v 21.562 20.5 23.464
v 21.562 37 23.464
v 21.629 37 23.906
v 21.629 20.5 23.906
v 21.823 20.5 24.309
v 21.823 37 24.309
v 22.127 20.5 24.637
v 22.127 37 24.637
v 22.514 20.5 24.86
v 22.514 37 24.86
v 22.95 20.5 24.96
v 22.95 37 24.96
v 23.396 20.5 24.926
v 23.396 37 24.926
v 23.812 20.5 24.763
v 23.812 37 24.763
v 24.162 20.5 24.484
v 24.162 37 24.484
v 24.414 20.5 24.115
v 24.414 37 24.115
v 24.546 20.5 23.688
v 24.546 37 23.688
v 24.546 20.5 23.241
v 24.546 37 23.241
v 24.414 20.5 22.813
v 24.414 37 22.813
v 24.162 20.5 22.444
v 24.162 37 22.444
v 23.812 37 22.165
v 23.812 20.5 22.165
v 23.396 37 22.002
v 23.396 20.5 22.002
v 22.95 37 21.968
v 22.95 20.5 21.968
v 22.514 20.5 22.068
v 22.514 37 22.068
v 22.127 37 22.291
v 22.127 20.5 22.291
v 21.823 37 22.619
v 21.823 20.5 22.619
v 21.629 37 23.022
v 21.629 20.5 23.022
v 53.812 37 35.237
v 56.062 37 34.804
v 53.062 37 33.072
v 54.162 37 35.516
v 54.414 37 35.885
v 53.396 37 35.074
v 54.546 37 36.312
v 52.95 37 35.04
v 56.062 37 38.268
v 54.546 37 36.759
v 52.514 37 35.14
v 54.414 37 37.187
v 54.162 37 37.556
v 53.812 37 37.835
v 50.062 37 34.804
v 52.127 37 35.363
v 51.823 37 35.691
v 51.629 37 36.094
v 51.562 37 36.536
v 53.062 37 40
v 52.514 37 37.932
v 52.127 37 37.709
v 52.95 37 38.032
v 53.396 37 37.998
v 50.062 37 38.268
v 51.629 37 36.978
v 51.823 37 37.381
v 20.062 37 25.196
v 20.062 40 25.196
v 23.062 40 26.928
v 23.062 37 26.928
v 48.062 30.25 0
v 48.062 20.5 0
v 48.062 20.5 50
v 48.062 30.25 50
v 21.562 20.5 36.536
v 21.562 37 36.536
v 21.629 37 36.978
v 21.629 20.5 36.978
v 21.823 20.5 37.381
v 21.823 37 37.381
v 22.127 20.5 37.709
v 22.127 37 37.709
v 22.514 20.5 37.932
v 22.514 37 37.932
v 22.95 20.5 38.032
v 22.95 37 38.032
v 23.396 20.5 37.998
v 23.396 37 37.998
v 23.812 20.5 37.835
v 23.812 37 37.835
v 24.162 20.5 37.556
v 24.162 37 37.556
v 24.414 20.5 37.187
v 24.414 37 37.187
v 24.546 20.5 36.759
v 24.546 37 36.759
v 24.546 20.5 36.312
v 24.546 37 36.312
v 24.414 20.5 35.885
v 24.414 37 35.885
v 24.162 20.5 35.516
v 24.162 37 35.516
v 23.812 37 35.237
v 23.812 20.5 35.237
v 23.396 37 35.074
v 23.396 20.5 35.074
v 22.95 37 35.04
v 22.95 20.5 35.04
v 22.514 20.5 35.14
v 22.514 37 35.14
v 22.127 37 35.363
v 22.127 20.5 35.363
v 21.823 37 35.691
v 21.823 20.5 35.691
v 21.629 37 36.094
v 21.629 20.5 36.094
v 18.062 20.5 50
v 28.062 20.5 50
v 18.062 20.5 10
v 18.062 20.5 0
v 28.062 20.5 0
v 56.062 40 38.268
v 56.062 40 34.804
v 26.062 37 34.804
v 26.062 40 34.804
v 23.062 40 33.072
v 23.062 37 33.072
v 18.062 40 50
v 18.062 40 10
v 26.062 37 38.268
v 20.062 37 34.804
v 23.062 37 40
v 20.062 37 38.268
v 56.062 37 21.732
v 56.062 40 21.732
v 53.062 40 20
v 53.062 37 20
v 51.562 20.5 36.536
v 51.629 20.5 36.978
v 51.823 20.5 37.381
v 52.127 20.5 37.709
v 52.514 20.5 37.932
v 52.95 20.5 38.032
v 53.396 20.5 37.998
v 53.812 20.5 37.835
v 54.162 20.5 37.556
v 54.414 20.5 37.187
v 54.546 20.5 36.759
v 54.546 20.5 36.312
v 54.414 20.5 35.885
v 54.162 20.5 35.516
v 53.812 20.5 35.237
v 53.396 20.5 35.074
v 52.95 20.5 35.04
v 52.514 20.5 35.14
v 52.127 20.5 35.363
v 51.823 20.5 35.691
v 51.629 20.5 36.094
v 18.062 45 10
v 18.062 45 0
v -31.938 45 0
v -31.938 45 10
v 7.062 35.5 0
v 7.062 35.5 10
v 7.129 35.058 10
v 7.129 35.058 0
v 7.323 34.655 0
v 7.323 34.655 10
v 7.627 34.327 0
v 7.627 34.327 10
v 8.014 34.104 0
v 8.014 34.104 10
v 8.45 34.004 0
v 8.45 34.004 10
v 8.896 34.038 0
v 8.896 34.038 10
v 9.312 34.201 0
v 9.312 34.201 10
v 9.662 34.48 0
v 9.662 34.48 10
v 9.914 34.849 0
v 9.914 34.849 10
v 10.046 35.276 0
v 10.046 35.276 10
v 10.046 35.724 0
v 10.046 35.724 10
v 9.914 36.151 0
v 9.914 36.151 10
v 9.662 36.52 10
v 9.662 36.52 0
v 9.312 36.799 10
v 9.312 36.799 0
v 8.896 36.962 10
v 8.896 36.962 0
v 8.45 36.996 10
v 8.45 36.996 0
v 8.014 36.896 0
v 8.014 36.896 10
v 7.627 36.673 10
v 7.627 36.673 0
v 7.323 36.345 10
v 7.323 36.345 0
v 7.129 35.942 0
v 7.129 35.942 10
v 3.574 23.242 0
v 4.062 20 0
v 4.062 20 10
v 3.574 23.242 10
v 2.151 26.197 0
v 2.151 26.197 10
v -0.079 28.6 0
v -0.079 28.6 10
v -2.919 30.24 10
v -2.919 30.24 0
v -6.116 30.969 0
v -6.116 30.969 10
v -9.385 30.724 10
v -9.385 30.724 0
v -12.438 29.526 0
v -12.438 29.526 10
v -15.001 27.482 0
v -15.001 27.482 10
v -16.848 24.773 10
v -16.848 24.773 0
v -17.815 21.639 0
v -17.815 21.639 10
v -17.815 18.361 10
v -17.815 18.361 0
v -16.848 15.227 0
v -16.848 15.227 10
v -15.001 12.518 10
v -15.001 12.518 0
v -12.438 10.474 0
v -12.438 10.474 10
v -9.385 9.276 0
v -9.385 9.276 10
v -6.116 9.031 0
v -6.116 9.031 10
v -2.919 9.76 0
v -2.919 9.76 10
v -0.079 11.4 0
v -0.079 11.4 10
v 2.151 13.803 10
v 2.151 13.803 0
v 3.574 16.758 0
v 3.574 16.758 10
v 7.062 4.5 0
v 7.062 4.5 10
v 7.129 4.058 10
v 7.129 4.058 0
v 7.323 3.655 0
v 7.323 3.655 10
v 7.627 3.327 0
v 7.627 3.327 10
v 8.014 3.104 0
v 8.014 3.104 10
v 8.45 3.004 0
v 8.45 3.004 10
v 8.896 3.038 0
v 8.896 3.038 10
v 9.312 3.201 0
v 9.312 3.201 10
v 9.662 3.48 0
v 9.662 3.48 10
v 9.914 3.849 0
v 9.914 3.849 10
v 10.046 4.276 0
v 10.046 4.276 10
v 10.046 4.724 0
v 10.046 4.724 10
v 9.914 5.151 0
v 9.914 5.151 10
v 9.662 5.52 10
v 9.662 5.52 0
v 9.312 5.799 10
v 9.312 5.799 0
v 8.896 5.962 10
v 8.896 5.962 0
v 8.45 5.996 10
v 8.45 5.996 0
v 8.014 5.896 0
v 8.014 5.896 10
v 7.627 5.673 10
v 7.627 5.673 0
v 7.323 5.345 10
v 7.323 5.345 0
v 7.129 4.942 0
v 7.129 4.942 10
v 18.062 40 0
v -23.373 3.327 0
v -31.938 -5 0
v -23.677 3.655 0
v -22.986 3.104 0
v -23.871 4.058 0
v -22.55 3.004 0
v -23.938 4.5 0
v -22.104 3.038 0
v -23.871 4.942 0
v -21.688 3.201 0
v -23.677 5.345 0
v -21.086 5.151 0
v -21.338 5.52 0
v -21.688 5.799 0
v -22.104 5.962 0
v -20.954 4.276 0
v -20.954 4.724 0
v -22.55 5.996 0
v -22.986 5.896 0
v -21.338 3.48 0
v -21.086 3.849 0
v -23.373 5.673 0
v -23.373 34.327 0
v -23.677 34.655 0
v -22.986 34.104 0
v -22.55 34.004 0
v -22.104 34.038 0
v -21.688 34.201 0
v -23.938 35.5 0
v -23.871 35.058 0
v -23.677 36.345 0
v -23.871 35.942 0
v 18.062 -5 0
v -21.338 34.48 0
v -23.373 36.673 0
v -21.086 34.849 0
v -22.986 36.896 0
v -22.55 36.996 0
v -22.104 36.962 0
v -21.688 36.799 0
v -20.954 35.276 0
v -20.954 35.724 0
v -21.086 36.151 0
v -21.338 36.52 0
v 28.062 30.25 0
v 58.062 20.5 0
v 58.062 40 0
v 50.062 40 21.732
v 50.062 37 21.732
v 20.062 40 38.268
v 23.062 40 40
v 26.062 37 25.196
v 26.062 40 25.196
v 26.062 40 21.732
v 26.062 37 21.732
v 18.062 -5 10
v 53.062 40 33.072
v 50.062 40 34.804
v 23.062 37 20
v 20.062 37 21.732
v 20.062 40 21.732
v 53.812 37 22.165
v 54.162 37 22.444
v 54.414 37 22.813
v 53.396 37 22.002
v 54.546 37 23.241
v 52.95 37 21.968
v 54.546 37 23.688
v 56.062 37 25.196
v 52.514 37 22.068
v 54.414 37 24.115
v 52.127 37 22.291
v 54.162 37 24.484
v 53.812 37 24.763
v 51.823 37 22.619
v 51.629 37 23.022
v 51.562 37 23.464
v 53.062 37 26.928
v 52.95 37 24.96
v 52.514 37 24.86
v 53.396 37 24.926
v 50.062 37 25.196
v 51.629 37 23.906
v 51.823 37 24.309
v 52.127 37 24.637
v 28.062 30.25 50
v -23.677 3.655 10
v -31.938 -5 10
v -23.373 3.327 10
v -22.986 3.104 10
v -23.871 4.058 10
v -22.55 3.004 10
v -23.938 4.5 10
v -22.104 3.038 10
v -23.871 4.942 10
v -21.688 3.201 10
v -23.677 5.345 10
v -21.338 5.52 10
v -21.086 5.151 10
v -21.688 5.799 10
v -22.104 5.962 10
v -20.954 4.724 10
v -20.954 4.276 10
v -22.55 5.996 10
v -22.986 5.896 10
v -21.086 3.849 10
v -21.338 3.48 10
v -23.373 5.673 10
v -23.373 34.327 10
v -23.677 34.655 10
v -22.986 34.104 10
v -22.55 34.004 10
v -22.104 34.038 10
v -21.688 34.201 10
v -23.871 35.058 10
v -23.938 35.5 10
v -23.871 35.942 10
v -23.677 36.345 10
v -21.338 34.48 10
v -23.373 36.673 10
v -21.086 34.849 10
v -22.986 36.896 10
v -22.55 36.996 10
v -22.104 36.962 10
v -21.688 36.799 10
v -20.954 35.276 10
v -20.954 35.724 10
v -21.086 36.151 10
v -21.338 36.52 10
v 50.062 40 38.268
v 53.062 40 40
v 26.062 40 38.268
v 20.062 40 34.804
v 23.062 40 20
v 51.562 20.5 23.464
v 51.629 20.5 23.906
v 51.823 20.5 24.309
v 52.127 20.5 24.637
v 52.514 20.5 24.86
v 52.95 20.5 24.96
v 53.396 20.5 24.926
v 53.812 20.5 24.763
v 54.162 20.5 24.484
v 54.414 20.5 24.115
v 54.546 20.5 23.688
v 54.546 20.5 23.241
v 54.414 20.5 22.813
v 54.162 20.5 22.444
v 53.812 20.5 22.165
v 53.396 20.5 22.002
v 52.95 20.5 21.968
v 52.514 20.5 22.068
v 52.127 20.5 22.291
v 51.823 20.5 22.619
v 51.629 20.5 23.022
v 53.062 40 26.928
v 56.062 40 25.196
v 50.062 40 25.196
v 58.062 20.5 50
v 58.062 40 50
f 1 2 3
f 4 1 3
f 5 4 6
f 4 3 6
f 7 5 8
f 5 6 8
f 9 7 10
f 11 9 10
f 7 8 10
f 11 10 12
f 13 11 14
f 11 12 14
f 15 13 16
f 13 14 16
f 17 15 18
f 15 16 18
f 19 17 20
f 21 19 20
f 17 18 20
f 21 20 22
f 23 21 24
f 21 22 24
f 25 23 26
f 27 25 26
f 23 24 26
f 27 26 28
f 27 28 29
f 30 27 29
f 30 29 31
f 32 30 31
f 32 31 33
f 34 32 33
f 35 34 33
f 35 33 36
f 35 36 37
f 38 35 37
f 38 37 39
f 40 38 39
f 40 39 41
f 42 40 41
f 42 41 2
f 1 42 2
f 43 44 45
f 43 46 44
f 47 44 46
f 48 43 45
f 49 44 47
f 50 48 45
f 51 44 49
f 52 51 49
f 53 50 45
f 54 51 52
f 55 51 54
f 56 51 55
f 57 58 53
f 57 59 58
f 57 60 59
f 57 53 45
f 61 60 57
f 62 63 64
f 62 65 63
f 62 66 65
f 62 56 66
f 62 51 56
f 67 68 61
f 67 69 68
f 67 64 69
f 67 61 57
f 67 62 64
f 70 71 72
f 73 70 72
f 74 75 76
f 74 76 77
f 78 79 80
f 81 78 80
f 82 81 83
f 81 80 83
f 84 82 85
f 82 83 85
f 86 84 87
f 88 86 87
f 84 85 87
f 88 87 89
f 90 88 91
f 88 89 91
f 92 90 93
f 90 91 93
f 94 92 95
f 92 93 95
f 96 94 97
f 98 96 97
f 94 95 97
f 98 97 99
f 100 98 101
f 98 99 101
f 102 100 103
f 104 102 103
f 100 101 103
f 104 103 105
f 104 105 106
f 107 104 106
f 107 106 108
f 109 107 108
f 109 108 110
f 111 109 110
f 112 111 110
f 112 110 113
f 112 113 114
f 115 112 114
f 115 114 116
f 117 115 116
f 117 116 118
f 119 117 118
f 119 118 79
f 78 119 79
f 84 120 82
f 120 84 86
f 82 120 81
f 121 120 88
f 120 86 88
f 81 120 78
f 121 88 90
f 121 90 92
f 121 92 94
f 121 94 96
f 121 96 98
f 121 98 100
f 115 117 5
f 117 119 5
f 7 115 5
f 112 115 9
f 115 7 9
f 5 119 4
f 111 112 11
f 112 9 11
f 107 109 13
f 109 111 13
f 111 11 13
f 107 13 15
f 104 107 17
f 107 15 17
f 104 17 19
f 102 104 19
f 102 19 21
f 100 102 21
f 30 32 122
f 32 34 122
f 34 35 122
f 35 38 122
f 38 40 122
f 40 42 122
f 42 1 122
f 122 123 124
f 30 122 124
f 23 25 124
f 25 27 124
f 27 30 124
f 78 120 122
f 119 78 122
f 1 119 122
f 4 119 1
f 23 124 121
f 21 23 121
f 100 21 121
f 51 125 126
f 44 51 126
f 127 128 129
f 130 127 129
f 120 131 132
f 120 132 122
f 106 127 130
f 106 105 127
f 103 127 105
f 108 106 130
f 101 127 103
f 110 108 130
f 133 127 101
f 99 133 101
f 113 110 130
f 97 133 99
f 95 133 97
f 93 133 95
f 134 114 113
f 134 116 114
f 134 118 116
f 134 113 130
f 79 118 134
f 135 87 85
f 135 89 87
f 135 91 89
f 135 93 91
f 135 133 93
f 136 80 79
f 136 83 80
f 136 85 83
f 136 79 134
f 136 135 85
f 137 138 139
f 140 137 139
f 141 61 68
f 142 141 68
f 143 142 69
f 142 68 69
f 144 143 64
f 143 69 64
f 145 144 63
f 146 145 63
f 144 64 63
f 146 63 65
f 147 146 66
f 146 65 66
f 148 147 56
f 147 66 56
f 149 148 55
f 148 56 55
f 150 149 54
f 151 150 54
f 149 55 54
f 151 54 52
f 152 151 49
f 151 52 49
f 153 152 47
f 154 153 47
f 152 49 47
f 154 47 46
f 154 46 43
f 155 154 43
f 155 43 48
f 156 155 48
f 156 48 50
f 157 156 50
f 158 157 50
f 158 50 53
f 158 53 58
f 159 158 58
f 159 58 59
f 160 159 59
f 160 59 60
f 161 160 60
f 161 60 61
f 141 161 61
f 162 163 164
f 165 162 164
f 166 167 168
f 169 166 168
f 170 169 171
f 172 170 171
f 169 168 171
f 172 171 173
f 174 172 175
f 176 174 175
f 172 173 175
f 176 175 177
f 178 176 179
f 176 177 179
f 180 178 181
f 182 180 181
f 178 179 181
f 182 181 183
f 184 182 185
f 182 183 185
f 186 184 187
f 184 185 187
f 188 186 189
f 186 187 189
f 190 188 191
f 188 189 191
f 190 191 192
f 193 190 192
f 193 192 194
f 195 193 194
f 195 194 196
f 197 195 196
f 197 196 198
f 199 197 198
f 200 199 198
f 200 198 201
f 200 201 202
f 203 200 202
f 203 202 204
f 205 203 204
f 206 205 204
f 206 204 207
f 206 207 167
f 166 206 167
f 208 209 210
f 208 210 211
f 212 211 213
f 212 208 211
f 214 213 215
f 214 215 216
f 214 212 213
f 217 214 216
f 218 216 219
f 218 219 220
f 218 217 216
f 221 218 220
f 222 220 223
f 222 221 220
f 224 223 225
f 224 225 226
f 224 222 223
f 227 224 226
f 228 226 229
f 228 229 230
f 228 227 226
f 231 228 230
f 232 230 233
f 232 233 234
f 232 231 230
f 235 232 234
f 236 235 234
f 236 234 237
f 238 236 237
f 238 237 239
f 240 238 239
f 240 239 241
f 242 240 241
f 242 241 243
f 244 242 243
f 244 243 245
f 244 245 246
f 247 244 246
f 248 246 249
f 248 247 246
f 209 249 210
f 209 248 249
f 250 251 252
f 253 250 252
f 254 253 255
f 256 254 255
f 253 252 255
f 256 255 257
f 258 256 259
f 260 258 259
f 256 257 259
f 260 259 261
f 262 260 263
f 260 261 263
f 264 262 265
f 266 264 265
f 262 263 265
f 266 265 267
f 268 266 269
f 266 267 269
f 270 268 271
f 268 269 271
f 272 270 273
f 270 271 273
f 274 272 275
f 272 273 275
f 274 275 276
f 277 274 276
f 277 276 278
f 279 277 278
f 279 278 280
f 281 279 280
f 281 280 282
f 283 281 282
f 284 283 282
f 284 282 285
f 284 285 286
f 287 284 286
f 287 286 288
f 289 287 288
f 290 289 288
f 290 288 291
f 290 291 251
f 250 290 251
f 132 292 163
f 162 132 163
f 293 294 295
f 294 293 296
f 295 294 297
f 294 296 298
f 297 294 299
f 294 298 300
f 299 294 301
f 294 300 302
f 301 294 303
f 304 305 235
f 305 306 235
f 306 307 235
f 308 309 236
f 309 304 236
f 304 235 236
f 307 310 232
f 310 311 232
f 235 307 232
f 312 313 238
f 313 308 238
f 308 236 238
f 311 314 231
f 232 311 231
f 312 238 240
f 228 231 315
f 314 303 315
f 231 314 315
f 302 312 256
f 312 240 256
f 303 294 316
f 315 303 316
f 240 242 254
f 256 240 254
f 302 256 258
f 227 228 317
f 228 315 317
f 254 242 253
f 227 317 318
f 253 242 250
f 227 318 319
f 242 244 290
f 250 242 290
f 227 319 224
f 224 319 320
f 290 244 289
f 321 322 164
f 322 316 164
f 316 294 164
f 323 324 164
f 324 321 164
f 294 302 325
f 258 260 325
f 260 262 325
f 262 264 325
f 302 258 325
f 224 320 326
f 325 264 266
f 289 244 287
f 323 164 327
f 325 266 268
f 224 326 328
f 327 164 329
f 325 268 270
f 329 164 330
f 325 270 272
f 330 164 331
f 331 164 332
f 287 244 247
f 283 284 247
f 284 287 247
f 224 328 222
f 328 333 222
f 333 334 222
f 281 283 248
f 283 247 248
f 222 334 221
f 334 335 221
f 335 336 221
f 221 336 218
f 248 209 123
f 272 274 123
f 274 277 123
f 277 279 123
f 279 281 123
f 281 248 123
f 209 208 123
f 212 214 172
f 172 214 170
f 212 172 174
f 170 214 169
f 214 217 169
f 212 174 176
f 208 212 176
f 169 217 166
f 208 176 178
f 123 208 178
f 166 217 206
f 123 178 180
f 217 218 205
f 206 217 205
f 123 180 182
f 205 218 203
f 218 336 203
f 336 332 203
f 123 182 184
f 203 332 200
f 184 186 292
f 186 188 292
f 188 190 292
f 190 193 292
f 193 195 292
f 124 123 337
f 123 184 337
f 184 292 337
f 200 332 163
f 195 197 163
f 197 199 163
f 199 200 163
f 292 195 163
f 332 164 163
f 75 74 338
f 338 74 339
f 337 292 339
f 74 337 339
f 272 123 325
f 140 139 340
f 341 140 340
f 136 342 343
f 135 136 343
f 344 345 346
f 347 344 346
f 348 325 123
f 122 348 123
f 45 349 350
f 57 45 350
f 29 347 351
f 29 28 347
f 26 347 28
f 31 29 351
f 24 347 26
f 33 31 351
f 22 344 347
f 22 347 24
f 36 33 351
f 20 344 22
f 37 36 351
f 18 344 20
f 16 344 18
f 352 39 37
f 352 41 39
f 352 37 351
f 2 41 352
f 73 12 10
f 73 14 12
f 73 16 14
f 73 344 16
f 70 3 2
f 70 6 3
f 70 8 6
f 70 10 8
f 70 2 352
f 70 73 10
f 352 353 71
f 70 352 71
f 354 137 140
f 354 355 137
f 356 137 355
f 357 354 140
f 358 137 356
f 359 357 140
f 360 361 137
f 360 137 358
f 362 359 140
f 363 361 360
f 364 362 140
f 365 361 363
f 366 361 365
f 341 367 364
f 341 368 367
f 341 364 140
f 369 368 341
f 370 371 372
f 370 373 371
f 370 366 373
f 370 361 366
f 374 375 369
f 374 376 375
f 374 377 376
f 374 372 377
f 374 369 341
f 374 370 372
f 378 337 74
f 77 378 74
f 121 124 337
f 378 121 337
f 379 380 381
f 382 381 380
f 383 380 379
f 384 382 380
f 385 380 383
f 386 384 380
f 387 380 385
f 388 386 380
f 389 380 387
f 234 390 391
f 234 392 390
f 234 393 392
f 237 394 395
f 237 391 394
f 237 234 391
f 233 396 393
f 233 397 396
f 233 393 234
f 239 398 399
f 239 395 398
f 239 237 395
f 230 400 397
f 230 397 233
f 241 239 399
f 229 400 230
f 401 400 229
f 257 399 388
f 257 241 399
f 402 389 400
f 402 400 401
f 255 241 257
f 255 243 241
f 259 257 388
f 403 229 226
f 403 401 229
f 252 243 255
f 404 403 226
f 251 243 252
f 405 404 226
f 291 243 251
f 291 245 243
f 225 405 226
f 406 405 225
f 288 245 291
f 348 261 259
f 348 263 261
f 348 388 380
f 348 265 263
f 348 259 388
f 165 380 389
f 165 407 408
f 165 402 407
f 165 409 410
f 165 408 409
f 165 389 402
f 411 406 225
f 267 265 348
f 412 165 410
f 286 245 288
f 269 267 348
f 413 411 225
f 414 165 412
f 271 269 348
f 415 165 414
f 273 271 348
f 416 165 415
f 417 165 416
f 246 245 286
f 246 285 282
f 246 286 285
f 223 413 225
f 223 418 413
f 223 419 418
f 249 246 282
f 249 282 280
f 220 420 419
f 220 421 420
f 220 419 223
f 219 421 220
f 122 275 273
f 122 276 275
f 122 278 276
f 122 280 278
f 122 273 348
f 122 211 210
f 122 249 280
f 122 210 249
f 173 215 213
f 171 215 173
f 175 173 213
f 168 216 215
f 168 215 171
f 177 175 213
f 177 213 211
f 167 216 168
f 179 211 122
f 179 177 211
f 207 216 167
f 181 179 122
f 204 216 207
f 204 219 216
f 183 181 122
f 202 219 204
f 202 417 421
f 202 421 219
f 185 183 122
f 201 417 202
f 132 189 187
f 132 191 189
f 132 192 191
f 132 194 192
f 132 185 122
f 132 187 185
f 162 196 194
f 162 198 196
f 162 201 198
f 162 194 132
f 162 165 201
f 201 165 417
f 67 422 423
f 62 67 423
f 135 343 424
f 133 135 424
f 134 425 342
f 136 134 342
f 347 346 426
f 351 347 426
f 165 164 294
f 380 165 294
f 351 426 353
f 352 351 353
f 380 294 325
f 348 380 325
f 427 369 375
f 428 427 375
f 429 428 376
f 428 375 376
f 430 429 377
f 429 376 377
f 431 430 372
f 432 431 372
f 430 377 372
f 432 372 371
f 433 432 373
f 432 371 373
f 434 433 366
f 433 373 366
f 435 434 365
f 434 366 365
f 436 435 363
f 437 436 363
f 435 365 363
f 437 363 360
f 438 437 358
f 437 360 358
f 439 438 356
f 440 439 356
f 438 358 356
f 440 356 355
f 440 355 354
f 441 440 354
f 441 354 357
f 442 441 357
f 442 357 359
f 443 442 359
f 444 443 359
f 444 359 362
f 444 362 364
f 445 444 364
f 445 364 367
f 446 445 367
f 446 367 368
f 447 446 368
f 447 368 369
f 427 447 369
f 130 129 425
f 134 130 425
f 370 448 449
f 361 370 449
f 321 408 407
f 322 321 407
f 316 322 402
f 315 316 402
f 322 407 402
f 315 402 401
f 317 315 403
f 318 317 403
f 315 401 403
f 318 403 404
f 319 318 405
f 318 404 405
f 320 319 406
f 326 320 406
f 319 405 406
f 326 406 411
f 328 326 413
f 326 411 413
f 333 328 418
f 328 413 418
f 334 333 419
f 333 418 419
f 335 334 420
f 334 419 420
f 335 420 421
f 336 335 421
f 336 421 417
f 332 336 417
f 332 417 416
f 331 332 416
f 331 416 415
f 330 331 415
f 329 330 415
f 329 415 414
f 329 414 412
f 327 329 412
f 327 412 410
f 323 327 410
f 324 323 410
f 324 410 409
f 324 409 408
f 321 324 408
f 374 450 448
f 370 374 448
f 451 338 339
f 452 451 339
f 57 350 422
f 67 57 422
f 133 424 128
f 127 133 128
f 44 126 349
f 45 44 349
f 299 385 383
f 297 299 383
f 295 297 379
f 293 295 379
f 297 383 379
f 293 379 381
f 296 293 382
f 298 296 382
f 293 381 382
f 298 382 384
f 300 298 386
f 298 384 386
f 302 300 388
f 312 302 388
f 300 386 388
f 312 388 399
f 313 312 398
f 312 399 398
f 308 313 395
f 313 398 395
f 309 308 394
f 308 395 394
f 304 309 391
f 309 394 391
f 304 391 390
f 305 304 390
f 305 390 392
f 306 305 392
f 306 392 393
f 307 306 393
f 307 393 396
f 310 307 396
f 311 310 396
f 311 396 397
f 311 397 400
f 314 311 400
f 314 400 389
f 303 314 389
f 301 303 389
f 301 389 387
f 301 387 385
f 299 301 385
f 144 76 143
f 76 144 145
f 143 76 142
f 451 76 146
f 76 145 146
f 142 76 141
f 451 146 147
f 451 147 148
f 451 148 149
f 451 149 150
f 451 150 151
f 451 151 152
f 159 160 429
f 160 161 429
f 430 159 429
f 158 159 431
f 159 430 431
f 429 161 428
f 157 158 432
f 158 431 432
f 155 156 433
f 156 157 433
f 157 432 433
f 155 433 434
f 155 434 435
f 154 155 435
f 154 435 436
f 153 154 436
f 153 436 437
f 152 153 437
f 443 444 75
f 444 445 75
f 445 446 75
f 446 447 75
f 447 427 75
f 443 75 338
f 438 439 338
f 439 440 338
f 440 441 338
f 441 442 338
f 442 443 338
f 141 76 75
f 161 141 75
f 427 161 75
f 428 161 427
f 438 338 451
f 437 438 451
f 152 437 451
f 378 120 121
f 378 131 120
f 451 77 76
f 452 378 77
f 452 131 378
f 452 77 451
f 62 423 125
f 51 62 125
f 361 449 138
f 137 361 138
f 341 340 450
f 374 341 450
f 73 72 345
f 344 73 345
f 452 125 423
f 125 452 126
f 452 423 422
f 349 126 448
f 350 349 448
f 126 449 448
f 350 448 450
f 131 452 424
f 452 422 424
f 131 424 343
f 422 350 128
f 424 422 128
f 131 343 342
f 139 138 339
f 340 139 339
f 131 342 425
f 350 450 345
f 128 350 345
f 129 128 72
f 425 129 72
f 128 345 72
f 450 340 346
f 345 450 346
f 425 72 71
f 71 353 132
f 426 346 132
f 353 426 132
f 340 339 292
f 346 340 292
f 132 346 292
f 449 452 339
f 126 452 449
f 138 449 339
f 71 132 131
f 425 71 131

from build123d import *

# Parameters (mm, degrees)
F0_R     = 11
F1_DEPTH = 10
F3_D     = 3
F0_W     = 10
F0_H     = 9.75
F0_W_2   = 20
F4_DEPTH = 50
F5_R     = 1.5
F6_DEPTH = 3
F7_DEPTH = 20


with BuildPart() as f1:
    # F0 (on Top) → F1 (new body)
    with BuildSketch(Plane.XY):
        Polygon((18.0623630062, 45), (-31.9376369938, 45), (-31.9376369938, -5), (18.0623630062, -5), (18.0623630062, 0), (18.0623630062, 20.5), (18.0623630062, 30.25), (18.0623630062, 40), align=None)
        with Locations((-6.9376369938, 20)):
            Circle(F0_R, mode=Mode.SUBTRACT)
    extrude(amount=F1_DEPTH)

    # F3 (through all)
    with Locations(Plane(origin=(0, 0, 0), x_dir=(1, 0, 0), z_dir=(0, 0, -1))):
        with Locations((8.5623630062, -4.5), (-22.4376369938, -4.5), (-22.4376369938, -35.5), (8.5623630062, -35.5)):
            Hole(F3_D / 2)

    # F0 (on Top) → F4 (join)
    with BuildSketch(Plane.XY):
        with Locations((23.0623630062, 25.375)):
            Rectangle(F0_W, F0_H)
        with Locations((23.0623630062, 35.125)):
            Rectangle(F0_W, F0_H)
        with Locations((38.0623630062, 35.125)):
            Rectangle(F0_W_2, F0_H)
        with Locations((53.0623630062, 35.125)):
            Rectangle(F0_W, F0_H)
        with Locations((53.0623630062, 25.375)):
            Rectangle(F0_W, F0_H)
    extrude(amount=F4_DEPTH)

    # F5 (on face) → F6 (cut)
    with BuildSketch(Plane(origin=(0, 40, 0), x_dir=(-1, 0, 0), z_dir=(0, 1, 0))):
        Polygon((-20.0623630062, 25.1961524227), (-23.0623630062, 26.9282032303), (-26.0623630062, 25.1961524227), (-26.0623630062, 21.7320508076), (-23.0623630062, 20), (-20.0623630062, 21.7320508076), align=None)
        with Locations((-23.0623630062, 23.4641016151)):
            Circle(F5_R, mode=Mode.SUBTRACT)
        Polygon((-20.0623630062, 38.2679491924), (-23.0623630062, 40), (-26.0623630062, 38.2679491924), (-26.0623630062, 34.8038475773), (-23.0623630062, 33.0717967697), (-20.0623630062, 34.8038475773), align=None)
        with Locations((-23.0623630062, 36.5358983849)):
            Circle(F5_R, mode=Mode.SUBTRACT)
        Polygon((-56.0623630062, 34.8038475773), (-53.0623630062, 33.0717967697), (-50.0623630062, 34.8038475773), (-50.0623630062, 38.2679491924), (-53.0623630062, 40), (-56.0623630062, 38.2679491924), align=None)
        with Locations((-53.0623630062, 36.5358983849)):
            Circle(F5_R, mode=Mode.SUBTRACT)
        Polygon((-56.0623630062, 21.7320508076), (-53.0623630062, 20), (-50.0623630062, 21.7320508076), (-50.0623630062, 25.1961524227), (-53.0623630062, 26.9282032303), (-56.0623630062, 25.1961524227), align=None)
        with Locations((-53.0623630062, 23.4641016151)):
            Circle(F5_R, mode=Mode.SUBTRACT)
    extrude(amount=-F6_DEPTH, mode=Mode.SUBTRACT)

    # F7 (cut): faces of the model
    f7_faces = [f1.faces().sort_by_distance(p)[0] for p in [
        (23.0623630062, 40, 23.4641016151),
        (23.0623630062, 40, 36.5358983849),
        (53.0623630062, 40, 36.5358983849),
        (53.0623630062, 40, 23.4641016151),
    ]]
    extrude(f7_faces, amount=-F7_DEPTH, mode=Mode.SUBTRACT)


solid = f1.part
